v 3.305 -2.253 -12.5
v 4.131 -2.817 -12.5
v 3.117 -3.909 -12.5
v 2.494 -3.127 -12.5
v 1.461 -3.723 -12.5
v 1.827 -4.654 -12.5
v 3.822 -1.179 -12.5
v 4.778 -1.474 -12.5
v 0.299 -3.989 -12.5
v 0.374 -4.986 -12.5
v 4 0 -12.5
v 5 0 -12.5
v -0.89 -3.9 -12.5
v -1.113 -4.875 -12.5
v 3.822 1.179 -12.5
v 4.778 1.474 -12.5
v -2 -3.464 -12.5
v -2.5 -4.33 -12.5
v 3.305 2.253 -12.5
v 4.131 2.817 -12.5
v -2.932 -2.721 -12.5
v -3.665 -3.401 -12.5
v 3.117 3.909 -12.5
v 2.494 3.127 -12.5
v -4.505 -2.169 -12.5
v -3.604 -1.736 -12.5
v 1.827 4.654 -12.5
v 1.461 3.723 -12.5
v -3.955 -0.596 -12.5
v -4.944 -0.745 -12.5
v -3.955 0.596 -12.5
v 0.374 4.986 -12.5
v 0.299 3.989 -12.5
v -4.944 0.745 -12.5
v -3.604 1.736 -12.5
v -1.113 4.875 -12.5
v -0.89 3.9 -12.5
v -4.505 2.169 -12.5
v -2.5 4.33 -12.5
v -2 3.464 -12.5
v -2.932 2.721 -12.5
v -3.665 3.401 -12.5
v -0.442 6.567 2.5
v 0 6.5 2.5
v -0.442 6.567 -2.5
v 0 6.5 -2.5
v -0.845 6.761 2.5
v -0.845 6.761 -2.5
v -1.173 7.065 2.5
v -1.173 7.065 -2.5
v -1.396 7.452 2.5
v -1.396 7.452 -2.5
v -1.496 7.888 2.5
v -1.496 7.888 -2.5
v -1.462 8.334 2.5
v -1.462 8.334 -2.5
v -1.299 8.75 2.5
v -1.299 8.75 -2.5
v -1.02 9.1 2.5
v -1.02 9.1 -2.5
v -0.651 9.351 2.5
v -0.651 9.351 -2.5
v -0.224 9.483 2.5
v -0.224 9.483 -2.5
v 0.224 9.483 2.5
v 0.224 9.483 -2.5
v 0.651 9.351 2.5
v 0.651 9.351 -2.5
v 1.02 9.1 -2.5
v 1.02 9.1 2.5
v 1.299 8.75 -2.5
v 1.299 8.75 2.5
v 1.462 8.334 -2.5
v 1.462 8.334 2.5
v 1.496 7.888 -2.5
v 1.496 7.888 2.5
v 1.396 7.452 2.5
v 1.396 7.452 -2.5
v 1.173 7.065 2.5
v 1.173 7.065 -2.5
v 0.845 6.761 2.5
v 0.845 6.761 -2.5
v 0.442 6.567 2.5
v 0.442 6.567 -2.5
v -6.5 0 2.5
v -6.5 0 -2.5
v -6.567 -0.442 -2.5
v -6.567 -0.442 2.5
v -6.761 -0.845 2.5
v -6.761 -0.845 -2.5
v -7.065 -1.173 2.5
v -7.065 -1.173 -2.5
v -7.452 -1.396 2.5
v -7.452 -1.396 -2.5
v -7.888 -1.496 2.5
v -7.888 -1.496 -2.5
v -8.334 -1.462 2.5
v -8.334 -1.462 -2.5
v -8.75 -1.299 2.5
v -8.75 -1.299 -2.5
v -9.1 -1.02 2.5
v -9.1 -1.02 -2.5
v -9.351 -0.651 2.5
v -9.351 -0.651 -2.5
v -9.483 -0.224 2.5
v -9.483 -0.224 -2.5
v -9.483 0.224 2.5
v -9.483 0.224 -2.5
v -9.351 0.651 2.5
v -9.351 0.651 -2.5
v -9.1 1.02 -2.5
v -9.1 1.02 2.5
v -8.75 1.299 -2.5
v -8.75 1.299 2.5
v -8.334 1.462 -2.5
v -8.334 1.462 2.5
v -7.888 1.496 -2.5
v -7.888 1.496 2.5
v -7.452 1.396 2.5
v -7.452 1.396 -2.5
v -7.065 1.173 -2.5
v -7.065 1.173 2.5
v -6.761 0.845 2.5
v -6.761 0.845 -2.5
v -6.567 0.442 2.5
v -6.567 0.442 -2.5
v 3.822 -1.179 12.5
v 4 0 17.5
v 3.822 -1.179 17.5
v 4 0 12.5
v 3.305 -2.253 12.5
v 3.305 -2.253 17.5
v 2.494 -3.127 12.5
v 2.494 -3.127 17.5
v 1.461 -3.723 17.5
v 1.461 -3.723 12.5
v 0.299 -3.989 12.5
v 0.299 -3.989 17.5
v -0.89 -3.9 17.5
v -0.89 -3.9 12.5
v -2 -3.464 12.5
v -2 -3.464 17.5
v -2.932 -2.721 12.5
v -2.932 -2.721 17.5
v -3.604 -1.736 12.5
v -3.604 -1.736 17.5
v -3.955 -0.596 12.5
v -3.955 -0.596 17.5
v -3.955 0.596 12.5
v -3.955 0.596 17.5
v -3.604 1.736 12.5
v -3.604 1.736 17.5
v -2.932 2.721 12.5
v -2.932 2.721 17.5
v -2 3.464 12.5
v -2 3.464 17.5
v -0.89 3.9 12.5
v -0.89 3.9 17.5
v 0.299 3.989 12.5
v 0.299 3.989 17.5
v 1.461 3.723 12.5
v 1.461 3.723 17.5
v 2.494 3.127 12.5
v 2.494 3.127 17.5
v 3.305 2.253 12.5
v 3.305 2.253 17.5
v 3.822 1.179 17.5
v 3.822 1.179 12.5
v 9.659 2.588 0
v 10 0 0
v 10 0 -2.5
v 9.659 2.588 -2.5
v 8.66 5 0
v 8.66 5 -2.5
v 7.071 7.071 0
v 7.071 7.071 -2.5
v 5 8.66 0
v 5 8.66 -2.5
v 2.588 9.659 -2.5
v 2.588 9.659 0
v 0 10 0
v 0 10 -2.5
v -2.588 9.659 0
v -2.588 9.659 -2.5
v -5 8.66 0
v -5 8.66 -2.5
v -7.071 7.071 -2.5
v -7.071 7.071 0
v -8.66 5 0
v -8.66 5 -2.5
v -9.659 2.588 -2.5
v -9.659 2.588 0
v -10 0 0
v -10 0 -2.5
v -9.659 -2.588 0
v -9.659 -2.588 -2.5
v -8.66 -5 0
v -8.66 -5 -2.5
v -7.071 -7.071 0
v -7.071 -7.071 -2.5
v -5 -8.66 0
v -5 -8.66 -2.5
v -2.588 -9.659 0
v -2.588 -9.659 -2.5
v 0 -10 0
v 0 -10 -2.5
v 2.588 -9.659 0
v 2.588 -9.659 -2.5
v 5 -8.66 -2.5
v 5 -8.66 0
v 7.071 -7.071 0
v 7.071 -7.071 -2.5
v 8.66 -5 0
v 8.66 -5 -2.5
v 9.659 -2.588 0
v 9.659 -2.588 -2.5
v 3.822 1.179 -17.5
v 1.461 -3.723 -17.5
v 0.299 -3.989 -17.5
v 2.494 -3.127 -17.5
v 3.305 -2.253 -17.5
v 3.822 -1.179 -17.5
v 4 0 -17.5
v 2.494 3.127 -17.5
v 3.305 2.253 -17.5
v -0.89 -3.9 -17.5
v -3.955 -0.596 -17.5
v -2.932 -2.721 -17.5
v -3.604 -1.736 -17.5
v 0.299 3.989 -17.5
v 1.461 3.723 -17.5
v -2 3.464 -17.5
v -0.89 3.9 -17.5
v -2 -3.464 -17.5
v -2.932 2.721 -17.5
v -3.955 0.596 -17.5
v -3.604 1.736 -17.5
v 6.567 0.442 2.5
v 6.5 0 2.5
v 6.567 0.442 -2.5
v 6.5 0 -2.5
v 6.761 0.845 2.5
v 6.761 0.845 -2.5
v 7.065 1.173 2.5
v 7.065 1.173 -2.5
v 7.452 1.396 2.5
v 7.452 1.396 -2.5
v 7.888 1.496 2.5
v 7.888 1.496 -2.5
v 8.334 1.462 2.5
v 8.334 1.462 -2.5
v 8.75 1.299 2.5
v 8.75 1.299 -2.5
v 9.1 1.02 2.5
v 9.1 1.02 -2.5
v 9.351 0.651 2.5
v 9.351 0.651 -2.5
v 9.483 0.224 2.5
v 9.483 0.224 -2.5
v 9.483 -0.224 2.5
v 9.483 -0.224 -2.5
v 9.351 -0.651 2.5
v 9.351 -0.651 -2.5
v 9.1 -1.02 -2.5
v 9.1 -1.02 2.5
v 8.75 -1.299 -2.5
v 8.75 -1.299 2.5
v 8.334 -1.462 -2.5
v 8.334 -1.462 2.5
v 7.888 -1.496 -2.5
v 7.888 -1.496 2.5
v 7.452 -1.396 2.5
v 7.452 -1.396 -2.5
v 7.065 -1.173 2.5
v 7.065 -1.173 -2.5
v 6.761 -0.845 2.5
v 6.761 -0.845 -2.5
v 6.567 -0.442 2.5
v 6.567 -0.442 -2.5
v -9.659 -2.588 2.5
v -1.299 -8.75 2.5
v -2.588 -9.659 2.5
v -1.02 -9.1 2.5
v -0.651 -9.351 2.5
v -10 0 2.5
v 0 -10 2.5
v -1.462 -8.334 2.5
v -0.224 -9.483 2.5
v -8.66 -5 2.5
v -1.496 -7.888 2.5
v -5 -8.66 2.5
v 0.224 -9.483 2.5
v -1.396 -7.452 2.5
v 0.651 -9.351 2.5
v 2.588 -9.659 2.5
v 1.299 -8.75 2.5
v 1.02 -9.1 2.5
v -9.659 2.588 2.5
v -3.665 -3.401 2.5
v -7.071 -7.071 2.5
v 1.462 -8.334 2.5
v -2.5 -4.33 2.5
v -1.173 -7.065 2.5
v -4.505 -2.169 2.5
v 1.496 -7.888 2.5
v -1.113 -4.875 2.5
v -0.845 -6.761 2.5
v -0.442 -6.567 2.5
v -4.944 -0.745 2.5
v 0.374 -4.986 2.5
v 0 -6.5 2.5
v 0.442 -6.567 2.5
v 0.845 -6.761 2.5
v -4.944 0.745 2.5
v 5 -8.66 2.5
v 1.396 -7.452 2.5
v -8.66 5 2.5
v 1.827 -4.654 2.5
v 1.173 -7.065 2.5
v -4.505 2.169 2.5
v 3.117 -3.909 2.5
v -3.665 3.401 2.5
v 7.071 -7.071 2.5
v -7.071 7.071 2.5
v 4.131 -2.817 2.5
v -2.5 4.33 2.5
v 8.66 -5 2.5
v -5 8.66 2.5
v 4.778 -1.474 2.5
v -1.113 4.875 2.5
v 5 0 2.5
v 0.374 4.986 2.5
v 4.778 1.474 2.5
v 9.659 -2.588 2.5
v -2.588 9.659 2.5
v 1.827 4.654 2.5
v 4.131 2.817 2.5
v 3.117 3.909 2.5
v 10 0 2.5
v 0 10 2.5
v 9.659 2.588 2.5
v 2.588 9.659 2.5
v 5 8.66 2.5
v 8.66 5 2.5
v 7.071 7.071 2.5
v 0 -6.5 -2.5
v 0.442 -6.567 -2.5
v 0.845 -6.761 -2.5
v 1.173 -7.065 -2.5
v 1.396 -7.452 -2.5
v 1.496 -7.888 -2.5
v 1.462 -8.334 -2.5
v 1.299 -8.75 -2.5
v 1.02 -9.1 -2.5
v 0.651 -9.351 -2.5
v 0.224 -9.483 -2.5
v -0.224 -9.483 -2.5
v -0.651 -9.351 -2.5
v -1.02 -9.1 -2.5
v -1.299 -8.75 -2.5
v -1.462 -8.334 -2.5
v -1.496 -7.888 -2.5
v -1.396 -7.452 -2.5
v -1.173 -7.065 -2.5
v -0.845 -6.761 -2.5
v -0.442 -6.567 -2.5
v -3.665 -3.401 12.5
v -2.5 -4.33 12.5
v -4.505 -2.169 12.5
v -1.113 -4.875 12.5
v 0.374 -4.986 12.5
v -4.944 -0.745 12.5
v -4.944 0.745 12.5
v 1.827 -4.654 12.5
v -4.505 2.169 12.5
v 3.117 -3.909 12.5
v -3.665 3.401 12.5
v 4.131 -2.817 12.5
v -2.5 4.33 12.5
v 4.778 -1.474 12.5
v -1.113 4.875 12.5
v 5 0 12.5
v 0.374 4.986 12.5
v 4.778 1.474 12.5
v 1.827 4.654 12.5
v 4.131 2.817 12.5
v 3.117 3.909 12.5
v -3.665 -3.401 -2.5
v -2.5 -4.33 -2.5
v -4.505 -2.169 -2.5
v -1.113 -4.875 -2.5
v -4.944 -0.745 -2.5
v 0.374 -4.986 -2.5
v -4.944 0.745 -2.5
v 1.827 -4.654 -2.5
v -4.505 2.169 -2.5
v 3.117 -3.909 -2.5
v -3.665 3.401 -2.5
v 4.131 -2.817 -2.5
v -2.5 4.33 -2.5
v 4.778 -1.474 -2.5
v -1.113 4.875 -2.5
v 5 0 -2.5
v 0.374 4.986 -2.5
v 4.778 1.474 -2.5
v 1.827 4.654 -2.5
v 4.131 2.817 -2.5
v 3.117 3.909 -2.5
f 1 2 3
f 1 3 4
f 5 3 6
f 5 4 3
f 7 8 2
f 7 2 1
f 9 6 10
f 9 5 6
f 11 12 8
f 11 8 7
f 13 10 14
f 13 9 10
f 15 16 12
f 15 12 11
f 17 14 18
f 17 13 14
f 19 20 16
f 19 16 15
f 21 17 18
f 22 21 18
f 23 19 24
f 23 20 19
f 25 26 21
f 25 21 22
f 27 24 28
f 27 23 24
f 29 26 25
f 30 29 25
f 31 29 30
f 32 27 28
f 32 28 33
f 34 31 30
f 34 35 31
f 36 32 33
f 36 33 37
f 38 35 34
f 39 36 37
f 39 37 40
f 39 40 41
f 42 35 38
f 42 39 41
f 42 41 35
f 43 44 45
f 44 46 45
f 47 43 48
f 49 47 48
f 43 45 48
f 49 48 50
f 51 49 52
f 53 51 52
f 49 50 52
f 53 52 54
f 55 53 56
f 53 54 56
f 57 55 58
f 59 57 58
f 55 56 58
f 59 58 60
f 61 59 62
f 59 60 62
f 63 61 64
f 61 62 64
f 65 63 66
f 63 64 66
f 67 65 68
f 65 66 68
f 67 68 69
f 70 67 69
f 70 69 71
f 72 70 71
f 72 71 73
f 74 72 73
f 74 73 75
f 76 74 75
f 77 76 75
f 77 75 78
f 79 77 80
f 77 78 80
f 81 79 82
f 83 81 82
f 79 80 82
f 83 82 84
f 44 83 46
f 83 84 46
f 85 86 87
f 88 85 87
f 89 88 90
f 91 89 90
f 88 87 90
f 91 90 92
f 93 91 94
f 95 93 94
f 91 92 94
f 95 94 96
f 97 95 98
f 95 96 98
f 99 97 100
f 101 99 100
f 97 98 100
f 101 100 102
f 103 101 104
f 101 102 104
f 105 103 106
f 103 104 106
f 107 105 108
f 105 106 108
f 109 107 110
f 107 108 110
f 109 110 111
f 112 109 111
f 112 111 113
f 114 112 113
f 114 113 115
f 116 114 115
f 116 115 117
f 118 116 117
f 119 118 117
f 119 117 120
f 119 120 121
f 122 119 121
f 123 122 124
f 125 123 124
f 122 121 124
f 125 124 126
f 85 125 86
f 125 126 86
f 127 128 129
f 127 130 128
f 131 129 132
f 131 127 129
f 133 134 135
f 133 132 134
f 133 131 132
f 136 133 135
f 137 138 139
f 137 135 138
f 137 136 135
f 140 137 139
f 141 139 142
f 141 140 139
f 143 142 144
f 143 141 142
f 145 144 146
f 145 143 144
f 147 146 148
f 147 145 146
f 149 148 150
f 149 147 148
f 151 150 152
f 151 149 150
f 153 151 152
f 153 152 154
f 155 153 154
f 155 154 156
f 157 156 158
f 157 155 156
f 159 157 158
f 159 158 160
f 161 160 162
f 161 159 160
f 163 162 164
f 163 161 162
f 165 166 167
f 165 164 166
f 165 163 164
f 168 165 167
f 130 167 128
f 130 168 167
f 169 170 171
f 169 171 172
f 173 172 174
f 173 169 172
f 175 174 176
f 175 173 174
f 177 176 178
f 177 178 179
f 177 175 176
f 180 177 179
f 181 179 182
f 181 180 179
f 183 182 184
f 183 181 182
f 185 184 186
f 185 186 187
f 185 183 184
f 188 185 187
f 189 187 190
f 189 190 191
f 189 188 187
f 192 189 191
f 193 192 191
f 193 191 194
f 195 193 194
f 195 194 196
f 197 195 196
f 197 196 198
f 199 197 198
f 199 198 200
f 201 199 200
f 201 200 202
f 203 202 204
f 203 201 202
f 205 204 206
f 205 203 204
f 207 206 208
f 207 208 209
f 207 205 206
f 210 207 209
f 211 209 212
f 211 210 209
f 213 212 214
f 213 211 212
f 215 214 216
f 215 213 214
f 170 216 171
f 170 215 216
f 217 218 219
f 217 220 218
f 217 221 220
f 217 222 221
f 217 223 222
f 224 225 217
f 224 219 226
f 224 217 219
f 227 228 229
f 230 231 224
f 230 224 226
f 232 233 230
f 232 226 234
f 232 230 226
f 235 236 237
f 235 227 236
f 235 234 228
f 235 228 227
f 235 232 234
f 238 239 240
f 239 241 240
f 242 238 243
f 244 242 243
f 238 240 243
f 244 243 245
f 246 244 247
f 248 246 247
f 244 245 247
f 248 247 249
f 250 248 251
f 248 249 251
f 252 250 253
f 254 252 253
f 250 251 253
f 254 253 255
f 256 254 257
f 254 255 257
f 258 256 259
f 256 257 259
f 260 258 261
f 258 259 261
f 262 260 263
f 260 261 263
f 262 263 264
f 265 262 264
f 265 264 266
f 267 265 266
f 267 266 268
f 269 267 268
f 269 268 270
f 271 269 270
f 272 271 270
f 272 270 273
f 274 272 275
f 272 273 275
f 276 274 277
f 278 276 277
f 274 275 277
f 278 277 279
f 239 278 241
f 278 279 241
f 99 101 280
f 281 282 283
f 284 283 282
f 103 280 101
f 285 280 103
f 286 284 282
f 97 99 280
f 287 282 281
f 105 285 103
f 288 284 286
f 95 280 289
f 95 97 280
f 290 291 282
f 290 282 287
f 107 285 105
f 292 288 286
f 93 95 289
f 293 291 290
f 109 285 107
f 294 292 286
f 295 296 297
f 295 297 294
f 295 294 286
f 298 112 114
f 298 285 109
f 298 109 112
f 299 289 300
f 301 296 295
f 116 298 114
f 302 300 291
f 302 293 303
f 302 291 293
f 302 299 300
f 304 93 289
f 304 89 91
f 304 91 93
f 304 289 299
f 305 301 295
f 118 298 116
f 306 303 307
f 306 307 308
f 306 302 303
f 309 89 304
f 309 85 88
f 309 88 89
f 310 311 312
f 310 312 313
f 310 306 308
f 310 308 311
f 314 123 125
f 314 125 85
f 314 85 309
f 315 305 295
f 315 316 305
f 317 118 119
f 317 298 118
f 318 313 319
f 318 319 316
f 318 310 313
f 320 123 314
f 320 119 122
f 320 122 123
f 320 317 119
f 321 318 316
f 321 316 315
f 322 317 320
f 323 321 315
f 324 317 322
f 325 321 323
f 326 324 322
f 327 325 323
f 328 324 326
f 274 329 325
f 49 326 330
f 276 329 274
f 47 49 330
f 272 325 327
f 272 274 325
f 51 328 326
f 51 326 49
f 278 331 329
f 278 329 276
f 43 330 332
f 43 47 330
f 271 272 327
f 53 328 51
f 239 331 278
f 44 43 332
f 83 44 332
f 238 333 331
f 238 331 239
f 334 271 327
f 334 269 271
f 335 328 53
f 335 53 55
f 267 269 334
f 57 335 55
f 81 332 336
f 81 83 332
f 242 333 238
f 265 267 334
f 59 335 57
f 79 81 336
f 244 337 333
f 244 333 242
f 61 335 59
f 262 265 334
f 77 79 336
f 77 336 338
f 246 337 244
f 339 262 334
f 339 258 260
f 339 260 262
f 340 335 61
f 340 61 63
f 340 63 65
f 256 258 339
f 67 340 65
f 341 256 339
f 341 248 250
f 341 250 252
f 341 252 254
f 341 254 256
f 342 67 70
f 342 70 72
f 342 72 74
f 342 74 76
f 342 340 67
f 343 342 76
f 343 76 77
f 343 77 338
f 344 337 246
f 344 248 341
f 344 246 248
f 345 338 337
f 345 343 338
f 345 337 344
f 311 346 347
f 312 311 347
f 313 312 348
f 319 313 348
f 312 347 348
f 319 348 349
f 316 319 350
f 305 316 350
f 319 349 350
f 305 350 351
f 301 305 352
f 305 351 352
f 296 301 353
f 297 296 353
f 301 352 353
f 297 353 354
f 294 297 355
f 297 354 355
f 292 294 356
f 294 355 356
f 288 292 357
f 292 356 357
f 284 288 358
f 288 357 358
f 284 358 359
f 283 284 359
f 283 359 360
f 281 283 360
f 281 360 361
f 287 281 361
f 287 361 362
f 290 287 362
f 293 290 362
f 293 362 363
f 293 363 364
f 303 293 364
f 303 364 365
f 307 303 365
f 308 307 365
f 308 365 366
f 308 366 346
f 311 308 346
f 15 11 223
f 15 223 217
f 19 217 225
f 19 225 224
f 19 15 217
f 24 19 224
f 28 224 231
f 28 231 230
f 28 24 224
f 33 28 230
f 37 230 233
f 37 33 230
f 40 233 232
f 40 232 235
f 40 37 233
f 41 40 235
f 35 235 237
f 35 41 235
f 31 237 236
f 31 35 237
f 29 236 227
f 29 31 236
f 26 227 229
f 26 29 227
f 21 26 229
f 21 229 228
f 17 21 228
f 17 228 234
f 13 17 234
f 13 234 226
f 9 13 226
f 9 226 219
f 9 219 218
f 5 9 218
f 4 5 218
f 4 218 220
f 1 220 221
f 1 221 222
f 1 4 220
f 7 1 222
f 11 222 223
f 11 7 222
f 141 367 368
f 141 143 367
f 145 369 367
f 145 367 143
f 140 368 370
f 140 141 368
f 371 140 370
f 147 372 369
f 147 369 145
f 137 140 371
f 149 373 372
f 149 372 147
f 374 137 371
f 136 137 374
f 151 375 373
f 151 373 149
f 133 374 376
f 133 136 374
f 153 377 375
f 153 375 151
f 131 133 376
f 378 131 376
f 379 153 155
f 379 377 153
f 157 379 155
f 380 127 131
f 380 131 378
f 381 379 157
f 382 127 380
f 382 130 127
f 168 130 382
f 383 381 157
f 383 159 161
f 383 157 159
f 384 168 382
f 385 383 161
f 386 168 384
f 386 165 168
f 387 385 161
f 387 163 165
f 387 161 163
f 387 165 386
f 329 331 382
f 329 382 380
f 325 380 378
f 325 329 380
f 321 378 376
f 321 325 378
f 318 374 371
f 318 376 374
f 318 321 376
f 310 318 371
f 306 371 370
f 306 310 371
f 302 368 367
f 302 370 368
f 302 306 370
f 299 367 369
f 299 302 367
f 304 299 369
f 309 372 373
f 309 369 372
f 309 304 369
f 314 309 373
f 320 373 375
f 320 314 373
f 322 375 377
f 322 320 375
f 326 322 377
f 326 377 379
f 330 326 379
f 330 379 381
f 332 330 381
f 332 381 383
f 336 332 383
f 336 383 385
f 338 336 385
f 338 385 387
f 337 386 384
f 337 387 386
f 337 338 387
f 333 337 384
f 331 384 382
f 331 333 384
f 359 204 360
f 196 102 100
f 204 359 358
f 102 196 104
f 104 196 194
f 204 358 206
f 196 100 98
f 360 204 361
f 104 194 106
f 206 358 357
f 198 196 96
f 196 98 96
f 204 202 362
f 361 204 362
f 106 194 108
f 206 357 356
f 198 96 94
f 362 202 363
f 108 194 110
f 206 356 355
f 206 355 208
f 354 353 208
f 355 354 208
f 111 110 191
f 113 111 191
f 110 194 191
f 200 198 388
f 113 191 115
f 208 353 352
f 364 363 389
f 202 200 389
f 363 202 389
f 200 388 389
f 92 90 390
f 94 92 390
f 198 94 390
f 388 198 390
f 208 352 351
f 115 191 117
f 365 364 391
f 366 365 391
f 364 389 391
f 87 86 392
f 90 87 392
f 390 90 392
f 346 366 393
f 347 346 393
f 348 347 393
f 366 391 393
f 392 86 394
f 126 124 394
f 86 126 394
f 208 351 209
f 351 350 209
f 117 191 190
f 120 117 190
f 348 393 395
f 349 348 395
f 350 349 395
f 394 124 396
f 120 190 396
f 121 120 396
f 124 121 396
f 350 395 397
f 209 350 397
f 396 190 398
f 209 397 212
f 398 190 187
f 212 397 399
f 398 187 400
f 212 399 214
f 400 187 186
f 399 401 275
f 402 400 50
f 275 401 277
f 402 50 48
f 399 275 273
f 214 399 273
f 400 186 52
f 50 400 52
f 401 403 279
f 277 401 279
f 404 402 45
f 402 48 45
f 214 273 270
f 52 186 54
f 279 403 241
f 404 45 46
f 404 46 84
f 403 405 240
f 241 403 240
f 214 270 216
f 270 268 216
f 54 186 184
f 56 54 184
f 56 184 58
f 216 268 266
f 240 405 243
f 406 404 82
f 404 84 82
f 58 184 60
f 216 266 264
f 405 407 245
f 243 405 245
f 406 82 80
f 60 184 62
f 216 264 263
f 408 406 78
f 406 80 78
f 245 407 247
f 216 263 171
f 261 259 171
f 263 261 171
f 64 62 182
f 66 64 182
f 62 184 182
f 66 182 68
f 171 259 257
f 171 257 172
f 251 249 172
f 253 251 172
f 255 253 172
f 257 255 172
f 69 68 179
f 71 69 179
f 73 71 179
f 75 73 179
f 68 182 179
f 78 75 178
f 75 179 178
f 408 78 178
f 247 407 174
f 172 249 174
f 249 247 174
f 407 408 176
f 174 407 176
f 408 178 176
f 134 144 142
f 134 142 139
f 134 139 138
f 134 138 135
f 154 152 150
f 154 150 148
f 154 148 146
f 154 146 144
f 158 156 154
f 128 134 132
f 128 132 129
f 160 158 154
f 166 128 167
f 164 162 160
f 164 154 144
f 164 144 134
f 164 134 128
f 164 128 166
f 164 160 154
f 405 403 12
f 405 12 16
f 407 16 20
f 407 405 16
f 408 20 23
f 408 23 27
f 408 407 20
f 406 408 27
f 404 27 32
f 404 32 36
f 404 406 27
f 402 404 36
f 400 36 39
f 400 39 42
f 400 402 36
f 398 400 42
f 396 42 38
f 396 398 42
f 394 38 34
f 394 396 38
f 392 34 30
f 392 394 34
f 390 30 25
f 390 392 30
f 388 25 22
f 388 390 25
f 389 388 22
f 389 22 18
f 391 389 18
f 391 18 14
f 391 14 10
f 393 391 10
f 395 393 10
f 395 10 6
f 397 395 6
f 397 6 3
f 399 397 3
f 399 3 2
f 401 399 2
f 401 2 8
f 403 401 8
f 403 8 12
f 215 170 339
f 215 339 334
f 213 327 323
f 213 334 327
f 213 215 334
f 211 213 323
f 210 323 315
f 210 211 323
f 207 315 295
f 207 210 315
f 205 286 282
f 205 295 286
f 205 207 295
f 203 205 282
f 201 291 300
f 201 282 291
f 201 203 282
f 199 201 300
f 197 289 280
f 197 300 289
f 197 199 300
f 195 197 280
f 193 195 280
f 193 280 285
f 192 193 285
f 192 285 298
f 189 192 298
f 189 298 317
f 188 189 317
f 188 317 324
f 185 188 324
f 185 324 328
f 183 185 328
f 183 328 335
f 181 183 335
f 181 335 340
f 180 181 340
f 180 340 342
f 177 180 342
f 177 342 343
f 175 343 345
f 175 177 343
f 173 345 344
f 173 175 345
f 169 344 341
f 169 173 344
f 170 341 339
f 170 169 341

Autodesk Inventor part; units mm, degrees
ref_plane "YZ Plane" through (0, 0, 0) normal (1, 0, 0) x (0, 1, 0)
ref_plane "XZ Plane" through (0, 0, 0) normal (0, 1, 0) x (-1, 0, 0)
ref_plane "XY Plane" through (0, 0, 0) normal (0, 0, 1) x (1, 0, 0)
sketch "スケッチ1" plane through (0, 0, 0) normal (0, 0, 1) x (1, 0, 0)
  circle A0 centre (0, 0) radius 10
  dimension "d0" = 20
extrude "押し出し1" add sketch "スケッチ1" along normal mid plane 5
sketch "スケッチ2" plane through (0, 0, 2.5) normal (0, 0, 1) x (1, 0, 0)
  circle A0 centre (0, 0) radius 5
  dimension "d3" = 10
extrude "押し出し2" add sketch "スケッチ2" along normal blind 10
sketch "スケッチ3" plane through (0, 0, 2.5) normal (0, 0, 1) x (1, 0, 0)
  point P0 (0, 0)
  point P1 (0, 8)
  dimension "d6" = 8
hole "穴1" at (0, 8, 2.5) direction (0, 0, -1) diameter 3 end through all
pattern_circular "円形状パターン1" count 4 over 360 about axis through (0, 0, -10) along (0, 0, 1) of "穴1"
sketch "スケッチ4" plane through (0, 0, 12.5) normal (0, 0, 1) x (1, 0, 0)
  circle A0 centre (0, 0) radius 4
  dimension "d19" = 8
extrude "押し出し3" add sketch "スケッチ4" along normal blind 5
mirror "ミラー1" about plane through (0, 0, 0) normal (0, 0, 1) of "押し出し2", "押し出し3"
properties part number "AR20.0_inside-shaft"
